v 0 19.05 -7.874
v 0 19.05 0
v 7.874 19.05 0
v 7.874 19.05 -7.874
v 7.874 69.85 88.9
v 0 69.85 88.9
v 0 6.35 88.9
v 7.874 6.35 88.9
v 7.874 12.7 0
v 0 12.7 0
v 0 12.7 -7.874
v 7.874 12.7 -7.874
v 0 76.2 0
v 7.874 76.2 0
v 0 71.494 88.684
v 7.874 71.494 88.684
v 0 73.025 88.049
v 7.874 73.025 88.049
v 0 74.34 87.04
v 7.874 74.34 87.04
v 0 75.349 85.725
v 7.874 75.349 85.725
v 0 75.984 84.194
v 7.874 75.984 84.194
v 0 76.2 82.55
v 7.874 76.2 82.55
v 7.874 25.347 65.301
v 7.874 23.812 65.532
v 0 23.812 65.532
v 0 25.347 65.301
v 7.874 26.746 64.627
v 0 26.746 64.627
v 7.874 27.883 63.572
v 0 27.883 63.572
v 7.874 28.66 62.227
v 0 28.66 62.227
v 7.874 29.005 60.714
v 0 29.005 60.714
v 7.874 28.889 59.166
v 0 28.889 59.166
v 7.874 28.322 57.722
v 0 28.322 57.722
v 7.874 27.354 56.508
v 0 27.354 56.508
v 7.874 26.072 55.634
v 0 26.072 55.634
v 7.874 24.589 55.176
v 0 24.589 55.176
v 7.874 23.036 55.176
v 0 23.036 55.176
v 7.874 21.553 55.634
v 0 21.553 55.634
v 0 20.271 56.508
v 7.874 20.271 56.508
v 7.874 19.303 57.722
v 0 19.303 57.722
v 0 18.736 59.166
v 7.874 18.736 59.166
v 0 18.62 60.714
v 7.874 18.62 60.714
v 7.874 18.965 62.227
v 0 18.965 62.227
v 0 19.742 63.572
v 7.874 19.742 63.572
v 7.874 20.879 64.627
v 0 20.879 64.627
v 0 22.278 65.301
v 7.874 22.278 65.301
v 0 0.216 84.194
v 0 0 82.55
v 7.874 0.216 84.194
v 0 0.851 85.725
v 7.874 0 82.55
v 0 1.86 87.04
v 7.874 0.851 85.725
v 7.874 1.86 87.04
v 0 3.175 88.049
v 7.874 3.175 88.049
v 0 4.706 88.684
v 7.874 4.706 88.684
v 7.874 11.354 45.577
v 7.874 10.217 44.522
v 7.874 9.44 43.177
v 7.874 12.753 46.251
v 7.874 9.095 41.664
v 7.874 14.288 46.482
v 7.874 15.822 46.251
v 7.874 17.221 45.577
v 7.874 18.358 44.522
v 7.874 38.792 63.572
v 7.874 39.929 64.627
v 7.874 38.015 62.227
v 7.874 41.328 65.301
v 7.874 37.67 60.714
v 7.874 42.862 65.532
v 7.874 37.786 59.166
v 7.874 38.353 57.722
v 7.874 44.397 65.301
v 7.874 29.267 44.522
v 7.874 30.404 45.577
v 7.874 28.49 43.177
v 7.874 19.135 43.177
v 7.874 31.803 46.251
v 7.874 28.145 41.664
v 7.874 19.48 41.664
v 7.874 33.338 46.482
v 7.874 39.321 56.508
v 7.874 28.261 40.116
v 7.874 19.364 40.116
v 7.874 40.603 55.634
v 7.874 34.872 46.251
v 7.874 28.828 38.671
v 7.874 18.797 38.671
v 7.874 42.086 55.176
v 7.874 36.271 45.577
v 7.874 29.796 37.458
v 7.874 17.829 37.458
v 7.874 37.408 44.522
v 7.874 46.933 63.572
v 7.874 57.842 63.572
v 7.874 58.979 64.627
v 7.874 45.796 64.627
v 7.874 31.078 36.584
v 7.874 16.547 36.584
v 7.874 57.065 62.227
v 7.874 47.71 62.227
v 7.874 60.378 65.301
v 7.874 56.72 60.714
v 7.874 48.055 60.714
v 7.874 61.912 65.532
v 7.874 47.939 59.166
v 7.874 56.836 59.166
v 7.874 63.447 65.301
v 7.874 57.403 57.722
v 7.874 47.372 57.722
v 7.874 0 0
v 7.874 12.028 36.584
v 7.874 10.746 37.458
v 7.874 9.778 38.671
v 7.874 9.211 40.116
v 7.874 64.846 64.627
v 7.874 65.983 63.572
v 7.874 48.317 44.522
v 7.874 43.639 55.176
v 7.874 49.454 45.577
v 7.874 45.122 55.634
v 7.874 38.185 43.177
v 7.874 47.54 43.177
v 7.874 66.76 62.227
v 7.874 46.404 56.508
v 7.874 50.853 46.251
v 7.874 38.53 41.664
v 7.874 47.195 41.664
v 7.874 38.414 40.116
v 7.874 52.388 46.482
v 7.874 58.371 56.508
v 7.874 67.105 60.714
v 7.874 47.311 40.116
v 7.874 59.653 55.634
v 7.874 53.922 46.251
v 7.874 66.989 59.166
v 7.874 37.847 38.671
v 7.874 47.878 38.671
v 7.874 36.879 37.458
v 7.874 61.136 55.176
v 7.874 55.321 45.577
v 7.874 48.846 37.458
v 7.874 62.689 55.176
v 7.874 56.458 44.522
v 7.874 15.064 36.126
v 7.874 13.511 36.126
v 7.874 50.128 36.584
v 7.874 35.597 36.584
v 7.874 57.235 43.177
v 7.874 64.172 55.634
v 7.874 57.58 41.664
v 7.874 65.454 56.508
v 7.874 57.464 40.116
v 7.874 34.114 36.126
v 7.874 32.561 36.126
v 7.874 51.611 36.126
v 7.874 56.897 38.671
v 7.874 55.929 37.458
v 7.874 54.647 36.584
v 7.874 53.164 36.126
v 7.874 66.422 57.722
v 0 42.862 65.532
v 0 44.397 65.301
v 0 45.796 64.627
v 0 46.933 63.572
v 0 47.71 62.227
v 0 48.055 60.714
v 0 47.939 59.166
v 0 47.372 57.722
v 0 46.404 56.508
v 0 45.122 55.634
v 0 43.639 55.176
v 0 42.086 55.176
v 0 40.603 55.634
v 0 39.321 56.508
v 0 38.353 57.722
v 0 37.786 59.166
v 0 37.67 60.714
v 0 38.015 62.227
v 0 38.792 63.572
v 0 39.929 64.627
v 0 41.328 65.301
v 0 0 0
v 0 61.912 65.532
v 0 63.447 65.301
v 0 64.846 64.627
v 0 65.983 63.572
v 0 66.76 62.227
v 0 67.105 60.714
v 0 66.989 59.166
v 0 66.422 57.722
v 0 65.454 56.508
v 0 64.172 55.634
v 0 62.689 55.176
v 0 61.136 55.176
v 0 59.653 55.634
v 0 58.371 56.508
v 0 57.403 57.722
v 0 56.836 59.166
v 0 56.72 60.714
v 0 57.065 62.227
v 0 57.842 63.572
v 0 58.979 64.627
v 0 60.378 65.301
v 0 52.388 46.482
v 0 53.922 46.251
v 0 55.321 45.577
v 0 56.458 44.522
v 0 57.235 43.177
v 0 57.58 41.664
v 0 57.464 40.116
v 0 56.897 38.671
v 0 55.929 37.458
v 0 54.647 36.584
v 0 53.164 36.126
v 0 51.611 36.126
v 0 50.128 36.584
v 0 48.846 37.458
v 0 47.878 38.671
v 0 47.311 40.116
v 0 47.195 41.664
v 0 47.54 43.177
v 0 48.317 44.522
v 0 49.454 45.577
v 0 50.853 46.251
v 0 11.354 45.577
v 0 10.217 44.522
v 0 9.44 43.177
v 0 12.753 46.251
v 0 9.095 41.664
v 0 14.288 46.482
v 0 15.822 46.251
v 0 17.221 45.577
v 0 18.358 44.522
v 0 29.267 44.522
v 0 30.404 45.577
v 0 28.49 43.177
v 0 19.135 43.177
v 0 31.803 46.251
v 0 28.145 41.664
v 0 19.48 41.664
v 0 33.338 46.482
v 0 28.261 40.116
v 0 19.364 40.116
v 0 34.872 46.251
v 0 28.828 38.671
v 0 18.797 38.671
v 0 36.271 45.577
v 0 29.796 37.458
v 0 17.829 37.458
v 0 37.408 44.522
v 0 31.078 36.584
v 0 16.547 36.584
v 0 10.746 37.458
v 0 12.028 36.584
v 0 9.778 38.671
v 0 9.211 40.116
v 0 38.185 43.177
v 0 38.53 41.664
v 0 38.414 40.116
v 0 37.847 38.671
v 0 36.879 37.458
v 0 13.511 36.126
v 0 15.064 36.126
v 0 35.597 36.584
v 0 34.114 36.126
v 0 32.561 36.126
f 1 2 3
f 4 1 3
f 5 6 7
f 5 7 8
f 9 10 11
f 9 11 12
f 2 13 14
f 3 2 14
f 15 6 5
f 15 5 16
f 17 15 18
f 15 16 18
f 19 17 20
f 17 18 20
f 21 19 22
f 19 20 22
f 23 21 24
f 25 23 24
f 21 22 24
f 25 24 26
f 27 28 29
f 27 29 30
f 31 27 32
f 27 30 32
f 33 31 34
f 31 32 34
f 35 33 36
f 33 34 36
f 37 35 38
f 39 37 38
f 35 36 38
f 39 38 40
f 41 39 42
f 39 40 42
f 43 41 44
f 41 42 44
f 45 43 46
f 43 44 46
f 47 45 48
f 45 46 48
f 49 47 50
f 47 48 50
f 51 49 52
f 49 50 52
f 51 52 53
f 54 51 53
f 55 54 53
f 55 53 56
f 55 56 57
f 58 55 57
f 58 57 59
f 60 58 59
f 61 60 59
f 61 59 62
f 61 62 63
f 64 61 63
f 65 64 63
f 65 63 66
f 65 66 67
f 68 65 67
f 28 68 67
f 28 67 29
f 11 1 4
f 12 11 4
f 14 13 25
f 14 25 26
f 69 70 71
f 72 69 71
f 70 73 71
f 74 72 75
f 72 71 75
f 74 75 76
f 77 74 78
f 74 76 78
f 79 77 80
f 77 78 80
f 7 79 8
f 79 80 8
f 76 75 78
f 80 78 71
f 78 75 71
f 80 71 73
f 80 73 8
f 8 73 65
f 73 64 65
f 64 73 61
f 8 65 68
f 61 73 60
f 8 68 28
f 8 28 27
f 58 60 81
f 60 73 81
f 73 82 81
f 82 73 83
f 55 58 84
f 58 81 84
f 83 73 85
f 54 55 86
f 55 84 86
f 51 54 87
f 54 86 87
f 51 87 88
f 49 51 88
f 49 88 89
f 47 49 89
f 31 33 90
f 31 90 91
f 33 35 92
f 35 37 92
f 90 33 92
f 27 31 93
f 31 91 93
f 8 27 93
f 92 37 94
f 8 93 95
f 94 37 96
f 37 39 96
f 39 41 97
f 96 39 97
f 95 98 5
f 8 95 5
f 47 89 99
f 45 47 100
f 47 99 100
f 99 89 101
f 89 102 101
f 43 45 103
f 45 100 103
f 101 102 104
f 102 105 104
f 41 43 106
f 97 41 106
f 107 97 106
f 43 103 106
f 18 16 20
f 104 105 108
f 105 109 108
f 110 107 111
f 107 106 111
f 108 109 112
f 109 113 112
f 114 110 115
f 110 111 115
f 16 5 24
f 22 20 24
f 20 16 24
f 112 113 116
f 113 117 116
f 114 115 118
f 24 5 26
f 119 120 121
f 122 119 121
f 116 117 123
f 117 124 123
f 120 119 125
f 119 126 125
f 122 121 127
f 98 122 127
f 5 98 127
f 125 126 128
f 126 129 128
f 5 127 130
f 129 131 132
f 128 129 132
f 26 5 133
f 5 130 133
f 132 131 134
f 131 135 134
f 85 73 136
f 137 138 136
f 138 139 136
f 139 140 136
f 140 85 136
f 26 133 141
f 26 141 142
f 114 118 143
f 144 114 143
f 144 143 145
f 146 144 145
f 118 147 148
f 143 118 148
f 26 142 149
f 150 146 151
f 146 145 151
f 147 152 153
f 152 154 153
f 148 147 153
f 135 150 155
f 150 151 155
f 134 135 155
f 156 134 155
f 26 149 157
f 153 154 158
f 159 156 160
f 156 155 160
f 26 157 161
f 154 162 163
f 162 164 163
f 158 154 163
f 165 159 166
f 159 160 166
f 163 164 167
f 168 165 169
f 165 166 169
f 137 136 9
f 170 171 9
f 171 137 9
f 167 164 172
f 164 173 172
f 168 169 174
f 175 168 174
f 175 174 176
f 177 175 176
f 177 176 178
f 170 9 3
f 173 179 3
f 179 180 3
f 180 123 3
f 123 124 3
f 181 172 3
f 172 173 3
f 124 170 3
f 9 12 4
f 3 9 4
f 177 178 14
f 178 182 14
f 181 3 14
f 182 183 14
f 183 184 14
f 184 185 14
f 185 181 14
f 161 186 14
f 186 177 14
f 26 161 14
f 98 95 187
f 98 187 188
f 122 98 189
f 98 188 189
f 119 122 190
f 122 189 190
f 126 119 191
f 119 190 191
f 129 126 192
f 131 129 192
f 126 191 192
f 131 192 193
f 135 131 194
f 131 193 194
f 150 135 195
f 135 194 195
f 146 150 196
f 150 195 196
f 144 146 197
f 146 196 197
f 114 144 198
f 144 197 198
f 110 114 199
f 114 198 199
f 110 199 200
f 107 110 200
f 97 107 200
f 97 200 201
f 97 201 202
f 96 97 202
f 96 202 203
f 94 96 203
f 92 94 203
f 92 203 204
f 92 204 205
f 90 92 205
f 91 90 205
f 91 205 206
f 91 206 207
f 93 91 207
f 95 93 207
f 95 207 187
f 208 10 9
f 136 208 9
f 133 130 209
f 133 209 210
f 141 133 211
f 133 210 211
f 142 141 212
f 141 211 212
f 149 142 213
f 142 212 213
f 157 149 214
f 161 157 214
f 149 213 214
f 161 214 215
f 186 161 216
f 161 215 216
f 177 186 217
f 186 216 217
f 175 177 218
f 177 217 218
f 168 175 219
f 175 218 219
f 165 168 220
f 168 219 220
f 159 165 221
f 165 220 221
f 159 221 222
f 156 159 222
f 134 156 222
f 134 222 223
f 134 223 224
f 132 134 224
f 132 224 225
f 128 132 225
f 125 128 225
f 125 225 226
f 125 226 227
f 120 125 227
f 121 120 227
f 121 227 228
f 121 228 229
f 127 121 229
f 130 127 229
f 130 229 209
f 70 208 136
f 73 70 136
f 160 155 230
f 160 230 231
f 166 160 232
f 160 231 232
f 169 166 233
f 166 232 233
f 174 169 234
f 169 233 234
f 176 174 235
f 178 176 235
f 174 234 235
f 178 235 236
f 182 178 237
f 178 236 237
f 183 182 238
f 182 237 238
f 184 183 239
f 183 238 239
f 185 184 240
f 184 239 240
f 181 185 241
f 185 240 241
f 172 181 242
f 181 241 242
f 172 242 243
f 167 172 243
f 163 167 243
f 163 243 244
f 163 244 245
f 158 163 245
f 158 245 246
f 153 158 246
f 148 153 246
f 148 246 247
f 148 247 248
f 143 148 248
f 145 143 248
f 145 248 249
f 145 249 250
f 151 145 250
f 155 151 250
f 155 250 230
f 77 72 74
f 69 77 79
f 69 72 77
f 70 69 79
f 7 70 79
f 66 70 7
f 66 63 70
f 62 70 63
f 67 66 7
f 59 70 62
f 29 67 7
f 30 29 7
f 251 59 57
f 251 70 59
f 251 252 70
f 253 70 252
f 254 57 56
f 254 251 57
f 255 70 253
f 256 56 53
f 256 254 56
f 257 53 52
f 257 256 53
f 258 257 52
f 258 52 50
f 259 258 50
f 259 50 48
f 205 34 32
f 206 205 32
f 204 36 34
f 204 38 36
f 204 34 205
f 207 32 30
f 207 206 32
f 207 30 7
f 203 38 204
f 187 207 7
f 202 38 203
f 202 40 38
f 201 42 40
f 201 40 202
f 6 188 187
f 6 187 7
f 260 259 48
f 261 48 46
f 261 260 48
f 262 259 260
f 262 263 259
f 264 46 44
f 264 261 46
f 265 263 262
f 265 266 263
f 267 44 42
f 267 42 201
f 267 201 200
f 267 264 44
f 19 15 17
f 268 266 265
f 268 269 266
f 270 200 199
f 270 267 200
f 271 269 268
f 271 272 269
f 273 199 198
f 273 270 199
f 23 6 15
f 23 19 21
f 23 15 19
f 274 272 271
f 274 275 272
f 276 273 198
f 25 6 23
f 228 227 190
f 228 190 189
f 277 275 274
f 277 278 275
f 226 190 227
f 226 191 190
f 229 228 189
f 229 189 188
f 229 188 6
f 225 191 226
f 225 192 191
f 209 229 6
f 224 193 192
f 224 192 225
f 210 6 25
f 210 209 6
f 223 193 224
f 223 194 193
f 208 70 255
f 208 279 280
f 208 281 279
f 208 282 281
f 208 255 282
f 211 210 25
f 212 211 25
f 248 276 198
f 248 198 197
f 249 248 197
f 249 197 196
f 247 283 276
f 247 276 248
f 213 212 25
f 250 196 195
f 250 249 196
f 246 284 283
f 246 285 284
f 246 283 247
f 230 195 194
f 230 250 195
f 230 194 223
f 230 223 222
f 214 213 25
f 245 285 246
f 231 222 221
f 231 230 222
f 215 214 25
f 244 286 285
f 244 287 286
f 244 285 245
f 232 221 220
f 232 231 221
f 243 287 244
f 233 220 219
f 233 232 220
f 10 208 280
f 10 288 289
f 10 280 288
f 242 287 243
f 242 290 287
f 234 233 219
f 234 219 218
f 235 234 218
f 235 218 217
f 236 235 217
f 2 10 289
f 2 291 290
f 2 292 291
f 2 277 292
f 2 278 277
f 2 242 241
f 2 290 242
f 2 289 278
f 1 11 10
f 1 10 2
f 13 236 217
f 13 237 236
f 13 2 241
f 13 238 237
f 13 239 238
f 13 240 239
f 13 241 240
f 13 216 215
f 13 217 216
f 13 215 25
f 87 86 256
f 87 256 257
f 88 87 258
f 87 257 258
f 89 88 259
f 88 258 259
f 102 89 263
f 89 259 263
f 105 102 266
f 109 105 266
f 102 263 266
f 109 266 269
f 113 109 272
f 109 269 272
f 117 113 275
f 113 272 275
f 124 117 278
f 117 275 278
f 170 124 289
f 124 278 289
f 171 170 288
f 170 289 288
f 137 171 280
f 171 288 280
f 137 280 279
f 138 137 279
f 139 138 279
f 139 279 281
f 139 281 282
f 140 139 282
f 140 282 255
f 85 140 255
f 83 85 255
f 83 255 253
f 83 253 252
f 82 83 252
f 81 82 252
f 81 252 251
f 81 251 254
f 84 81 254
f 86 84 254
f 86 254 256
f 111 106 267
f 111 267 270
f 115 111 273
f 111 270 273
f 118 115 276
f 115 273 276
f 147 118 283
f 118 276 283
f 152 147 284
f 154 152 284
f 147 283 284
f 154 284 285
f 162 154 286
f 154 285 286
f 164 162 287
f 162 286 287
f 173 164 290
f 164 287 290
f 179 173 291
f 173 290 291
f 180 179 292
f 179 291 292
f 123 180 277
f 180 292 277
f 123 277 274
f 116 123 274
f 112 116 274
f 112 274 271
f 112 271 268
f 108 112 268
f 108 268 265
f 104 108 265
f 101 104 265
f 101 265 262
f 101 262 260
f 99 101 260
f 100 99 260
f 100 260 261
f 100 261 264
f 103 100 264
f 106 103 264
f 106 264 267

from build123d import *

# Parameters (mm, degrees)
SKETCH1_W          = 7.874
SKETCH1_H          = 76.2
EXTRUDE1_DEPTH     = 88.9
SKETCH2_R          = 5.207
CUT_EXTRUDE1_DEPTH = 8.874
FILLET1_R          = 6.35
SKETCH3_W          = 7.874
SKETCH3_H          = 6.35
EXTRUDE2_DEPTH     = 7.874


with BuildPart() as part:
    # Sketch1 → Extrude1 (new body)
    with BuildSketch(Plane.XY):
        with Locations((3.937, 38.1)):
            Rectangle(SKETCH1_W, SKETCH1_H)
    extrude(amount=EXTRUDE1_DEPTH)

    # Sketch2 → Cut-Extrude1 (cut, through all)
    with BuildSketch(Plane.ZY):
        with Locations((60.325, 23.8125)):
            Circle(SKETCH2_R)
        with Locations((60.325, 42.8625)):
            Circle(SKETCH2_R)
        with Locations((60.325, 61.9125)):
            Circle(SKETCH2_R)
        with Locations((41.275, 33.3375)):
            Circle(SKETCH2_R)
        with Locations((41.275, 52.3875)):
            Circle(SKETCH2_R)
        with Locations((41.275, 14.2875)):
            Circle(SKETCH2_R)
    extrude(amount=-CUT_EXTRUDE1_DEPTH, mode=Mode.SUBTRACT)

    # Fillet1
    fillet1_edges = [part.edges().sort_by_distance(p)[0] for p in [
        (3.937, 76.2, 88.9),
        (3.937, 0, 88.9),
    ]]
    fillet(fillet1_edges, radius=FILLET1_R)

    # Sketch3 → Extrude2 (add)
    with BuildSketch(Plane.XY):
        with Locations((3.937, 15.875)):
            Rectangle(SKETCH3_W, SKETCH3_H)
    extrude(amount=-EXTRUDE2_DEPTH)


solid = part.part
